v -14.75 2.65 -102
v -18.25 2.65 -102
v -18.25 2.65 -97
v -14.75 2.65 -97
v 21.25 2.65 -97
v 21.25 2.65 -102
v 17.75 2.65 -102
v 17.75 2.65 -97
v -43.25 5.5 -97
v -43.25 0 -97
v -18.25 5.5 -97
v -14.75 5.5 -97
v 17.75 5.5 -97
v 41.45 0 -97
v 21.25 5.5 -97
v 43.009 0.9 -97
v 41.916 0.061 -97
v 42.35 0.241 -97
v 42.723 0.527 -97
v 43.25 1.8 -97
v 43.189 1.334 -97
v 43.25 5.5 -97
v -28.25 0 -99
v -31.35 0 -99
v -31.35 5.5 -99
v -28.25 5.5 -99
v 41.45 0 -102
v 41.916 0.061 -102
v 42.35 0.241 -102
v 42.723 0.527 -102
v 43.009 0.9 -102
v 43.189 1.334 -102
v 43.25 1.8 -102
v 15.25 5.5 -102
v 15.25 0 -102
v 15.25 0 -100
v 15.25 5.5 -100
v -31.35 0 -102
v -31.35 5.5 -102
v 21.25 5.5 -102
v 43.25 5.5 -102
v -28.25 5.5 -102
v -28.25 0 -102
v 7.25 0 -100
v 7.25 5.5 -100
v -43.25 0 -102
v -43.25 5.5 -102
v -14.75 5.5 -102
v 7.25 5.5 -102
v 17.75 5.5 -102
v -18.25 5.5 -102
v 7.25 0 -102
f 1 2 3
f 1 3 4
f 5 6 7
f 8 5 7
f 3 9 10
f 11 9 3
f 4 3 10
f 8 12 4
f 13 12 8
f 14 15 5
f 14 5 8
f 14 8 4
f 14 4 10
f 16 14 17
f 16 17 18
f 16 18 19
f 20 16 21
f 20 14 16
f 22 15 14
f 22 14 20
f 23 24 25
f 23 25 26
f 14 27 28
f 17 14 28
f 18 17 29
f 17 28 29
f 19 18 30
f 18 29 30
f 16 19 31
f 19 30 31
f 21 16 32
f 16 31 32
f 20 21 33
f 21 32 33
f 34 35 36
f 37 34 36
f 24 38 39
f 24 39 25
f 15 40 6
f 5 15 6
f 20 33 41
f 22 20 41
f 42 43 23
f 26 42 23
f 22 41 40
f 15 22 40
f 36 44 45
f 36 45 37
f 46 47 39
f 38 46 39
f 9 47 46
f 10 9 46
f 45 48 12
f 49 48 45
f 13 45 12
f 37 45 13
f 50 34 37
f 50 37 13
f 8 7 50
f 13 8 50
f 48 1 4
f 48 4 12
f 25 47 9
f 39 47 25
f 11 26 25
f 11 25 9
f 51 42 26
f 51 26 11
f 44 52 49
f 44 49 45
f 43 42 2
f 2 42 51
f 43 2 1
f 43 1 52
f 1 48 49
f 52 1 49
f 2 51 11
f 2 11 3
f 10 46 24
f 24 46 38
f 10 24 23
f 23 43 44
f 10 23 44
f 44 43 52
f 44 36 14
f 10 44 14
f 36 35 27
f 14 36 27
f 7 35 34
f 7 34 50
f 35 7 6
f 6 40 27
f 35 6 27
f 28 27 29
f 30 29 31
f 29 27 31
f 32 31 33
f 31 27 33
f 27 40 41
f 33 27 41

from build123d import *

# Parameters (mm, degrees)
PAD013_DEPTH    = 5
SKETCH019_W     = 8
SKETCH019_H     = 5
POCKET001_DEPTH = 10
SKETCH020_W     = 3.1
SKETCH020_H     = 5
POCKET002_DEPTH = 10


with BuildPart() as part:
    # Sketch018 → Pad013 (new body)
    with BuildSketch(Plane.XY):
        with BuildLine():
            Line((-43.25, 0), (41.45, 0))
            ThreePointArc((41.45, 0), (42.722792, 0.527208), (43.25, 1.8))
            Line((43.25, 1.8), (43.25, 5.5))
            Line((43.25, 5.5), (21.25, 5.5))
            Line((21.25, 5.5), (21.25, 2.65))
            Line((21.25, 2.65), (17.75, 2.65))
            Line((17.75, 2.65), (17.75, 5.5))
            Line((-14.75, 5.5), (17.75, 5.5))
            Line((-14.75, 2.65), (-14.75, 5.5))
            Line((-18.25, 2.65), (-14.75, 2.65))
            Line((-18.25, 5.5), (-18.25, 2.65))
            Line((-43.25, 5.5), (-18.25, 5.5))
            Line((-43.25, 5.5), (-43.25, 0))
        make_face()
    extrude(amount=PAD013_DEPTH)

    # Sketch019 → Pocket001 (cut)
    with BuildSketch(Plane.XZ):
        with Locations((11.25, -0.5)):
            Rectangle(SKETCH019_W, SKETCH019_H)
    extrude(amount=-POCKET001_DEPTH, mode=Mode.SUBTRACT)

    # Sketch020 → Pocket002 (cut)
    with BuildSketch(Plane.XZ):
        with Locations((-29.8, 0.5)):
            Rectangle(SKETCH020_W, SKETCH020_H)
    extrude(amount=-POCKET002_DEPTH, mode=Mode.SUBTRACT)


with BuildPart() as part_1:
    # Body010 placement: moved
    add(part.part.moved(Location((0, 0, -102))))


solid = part_1.part
